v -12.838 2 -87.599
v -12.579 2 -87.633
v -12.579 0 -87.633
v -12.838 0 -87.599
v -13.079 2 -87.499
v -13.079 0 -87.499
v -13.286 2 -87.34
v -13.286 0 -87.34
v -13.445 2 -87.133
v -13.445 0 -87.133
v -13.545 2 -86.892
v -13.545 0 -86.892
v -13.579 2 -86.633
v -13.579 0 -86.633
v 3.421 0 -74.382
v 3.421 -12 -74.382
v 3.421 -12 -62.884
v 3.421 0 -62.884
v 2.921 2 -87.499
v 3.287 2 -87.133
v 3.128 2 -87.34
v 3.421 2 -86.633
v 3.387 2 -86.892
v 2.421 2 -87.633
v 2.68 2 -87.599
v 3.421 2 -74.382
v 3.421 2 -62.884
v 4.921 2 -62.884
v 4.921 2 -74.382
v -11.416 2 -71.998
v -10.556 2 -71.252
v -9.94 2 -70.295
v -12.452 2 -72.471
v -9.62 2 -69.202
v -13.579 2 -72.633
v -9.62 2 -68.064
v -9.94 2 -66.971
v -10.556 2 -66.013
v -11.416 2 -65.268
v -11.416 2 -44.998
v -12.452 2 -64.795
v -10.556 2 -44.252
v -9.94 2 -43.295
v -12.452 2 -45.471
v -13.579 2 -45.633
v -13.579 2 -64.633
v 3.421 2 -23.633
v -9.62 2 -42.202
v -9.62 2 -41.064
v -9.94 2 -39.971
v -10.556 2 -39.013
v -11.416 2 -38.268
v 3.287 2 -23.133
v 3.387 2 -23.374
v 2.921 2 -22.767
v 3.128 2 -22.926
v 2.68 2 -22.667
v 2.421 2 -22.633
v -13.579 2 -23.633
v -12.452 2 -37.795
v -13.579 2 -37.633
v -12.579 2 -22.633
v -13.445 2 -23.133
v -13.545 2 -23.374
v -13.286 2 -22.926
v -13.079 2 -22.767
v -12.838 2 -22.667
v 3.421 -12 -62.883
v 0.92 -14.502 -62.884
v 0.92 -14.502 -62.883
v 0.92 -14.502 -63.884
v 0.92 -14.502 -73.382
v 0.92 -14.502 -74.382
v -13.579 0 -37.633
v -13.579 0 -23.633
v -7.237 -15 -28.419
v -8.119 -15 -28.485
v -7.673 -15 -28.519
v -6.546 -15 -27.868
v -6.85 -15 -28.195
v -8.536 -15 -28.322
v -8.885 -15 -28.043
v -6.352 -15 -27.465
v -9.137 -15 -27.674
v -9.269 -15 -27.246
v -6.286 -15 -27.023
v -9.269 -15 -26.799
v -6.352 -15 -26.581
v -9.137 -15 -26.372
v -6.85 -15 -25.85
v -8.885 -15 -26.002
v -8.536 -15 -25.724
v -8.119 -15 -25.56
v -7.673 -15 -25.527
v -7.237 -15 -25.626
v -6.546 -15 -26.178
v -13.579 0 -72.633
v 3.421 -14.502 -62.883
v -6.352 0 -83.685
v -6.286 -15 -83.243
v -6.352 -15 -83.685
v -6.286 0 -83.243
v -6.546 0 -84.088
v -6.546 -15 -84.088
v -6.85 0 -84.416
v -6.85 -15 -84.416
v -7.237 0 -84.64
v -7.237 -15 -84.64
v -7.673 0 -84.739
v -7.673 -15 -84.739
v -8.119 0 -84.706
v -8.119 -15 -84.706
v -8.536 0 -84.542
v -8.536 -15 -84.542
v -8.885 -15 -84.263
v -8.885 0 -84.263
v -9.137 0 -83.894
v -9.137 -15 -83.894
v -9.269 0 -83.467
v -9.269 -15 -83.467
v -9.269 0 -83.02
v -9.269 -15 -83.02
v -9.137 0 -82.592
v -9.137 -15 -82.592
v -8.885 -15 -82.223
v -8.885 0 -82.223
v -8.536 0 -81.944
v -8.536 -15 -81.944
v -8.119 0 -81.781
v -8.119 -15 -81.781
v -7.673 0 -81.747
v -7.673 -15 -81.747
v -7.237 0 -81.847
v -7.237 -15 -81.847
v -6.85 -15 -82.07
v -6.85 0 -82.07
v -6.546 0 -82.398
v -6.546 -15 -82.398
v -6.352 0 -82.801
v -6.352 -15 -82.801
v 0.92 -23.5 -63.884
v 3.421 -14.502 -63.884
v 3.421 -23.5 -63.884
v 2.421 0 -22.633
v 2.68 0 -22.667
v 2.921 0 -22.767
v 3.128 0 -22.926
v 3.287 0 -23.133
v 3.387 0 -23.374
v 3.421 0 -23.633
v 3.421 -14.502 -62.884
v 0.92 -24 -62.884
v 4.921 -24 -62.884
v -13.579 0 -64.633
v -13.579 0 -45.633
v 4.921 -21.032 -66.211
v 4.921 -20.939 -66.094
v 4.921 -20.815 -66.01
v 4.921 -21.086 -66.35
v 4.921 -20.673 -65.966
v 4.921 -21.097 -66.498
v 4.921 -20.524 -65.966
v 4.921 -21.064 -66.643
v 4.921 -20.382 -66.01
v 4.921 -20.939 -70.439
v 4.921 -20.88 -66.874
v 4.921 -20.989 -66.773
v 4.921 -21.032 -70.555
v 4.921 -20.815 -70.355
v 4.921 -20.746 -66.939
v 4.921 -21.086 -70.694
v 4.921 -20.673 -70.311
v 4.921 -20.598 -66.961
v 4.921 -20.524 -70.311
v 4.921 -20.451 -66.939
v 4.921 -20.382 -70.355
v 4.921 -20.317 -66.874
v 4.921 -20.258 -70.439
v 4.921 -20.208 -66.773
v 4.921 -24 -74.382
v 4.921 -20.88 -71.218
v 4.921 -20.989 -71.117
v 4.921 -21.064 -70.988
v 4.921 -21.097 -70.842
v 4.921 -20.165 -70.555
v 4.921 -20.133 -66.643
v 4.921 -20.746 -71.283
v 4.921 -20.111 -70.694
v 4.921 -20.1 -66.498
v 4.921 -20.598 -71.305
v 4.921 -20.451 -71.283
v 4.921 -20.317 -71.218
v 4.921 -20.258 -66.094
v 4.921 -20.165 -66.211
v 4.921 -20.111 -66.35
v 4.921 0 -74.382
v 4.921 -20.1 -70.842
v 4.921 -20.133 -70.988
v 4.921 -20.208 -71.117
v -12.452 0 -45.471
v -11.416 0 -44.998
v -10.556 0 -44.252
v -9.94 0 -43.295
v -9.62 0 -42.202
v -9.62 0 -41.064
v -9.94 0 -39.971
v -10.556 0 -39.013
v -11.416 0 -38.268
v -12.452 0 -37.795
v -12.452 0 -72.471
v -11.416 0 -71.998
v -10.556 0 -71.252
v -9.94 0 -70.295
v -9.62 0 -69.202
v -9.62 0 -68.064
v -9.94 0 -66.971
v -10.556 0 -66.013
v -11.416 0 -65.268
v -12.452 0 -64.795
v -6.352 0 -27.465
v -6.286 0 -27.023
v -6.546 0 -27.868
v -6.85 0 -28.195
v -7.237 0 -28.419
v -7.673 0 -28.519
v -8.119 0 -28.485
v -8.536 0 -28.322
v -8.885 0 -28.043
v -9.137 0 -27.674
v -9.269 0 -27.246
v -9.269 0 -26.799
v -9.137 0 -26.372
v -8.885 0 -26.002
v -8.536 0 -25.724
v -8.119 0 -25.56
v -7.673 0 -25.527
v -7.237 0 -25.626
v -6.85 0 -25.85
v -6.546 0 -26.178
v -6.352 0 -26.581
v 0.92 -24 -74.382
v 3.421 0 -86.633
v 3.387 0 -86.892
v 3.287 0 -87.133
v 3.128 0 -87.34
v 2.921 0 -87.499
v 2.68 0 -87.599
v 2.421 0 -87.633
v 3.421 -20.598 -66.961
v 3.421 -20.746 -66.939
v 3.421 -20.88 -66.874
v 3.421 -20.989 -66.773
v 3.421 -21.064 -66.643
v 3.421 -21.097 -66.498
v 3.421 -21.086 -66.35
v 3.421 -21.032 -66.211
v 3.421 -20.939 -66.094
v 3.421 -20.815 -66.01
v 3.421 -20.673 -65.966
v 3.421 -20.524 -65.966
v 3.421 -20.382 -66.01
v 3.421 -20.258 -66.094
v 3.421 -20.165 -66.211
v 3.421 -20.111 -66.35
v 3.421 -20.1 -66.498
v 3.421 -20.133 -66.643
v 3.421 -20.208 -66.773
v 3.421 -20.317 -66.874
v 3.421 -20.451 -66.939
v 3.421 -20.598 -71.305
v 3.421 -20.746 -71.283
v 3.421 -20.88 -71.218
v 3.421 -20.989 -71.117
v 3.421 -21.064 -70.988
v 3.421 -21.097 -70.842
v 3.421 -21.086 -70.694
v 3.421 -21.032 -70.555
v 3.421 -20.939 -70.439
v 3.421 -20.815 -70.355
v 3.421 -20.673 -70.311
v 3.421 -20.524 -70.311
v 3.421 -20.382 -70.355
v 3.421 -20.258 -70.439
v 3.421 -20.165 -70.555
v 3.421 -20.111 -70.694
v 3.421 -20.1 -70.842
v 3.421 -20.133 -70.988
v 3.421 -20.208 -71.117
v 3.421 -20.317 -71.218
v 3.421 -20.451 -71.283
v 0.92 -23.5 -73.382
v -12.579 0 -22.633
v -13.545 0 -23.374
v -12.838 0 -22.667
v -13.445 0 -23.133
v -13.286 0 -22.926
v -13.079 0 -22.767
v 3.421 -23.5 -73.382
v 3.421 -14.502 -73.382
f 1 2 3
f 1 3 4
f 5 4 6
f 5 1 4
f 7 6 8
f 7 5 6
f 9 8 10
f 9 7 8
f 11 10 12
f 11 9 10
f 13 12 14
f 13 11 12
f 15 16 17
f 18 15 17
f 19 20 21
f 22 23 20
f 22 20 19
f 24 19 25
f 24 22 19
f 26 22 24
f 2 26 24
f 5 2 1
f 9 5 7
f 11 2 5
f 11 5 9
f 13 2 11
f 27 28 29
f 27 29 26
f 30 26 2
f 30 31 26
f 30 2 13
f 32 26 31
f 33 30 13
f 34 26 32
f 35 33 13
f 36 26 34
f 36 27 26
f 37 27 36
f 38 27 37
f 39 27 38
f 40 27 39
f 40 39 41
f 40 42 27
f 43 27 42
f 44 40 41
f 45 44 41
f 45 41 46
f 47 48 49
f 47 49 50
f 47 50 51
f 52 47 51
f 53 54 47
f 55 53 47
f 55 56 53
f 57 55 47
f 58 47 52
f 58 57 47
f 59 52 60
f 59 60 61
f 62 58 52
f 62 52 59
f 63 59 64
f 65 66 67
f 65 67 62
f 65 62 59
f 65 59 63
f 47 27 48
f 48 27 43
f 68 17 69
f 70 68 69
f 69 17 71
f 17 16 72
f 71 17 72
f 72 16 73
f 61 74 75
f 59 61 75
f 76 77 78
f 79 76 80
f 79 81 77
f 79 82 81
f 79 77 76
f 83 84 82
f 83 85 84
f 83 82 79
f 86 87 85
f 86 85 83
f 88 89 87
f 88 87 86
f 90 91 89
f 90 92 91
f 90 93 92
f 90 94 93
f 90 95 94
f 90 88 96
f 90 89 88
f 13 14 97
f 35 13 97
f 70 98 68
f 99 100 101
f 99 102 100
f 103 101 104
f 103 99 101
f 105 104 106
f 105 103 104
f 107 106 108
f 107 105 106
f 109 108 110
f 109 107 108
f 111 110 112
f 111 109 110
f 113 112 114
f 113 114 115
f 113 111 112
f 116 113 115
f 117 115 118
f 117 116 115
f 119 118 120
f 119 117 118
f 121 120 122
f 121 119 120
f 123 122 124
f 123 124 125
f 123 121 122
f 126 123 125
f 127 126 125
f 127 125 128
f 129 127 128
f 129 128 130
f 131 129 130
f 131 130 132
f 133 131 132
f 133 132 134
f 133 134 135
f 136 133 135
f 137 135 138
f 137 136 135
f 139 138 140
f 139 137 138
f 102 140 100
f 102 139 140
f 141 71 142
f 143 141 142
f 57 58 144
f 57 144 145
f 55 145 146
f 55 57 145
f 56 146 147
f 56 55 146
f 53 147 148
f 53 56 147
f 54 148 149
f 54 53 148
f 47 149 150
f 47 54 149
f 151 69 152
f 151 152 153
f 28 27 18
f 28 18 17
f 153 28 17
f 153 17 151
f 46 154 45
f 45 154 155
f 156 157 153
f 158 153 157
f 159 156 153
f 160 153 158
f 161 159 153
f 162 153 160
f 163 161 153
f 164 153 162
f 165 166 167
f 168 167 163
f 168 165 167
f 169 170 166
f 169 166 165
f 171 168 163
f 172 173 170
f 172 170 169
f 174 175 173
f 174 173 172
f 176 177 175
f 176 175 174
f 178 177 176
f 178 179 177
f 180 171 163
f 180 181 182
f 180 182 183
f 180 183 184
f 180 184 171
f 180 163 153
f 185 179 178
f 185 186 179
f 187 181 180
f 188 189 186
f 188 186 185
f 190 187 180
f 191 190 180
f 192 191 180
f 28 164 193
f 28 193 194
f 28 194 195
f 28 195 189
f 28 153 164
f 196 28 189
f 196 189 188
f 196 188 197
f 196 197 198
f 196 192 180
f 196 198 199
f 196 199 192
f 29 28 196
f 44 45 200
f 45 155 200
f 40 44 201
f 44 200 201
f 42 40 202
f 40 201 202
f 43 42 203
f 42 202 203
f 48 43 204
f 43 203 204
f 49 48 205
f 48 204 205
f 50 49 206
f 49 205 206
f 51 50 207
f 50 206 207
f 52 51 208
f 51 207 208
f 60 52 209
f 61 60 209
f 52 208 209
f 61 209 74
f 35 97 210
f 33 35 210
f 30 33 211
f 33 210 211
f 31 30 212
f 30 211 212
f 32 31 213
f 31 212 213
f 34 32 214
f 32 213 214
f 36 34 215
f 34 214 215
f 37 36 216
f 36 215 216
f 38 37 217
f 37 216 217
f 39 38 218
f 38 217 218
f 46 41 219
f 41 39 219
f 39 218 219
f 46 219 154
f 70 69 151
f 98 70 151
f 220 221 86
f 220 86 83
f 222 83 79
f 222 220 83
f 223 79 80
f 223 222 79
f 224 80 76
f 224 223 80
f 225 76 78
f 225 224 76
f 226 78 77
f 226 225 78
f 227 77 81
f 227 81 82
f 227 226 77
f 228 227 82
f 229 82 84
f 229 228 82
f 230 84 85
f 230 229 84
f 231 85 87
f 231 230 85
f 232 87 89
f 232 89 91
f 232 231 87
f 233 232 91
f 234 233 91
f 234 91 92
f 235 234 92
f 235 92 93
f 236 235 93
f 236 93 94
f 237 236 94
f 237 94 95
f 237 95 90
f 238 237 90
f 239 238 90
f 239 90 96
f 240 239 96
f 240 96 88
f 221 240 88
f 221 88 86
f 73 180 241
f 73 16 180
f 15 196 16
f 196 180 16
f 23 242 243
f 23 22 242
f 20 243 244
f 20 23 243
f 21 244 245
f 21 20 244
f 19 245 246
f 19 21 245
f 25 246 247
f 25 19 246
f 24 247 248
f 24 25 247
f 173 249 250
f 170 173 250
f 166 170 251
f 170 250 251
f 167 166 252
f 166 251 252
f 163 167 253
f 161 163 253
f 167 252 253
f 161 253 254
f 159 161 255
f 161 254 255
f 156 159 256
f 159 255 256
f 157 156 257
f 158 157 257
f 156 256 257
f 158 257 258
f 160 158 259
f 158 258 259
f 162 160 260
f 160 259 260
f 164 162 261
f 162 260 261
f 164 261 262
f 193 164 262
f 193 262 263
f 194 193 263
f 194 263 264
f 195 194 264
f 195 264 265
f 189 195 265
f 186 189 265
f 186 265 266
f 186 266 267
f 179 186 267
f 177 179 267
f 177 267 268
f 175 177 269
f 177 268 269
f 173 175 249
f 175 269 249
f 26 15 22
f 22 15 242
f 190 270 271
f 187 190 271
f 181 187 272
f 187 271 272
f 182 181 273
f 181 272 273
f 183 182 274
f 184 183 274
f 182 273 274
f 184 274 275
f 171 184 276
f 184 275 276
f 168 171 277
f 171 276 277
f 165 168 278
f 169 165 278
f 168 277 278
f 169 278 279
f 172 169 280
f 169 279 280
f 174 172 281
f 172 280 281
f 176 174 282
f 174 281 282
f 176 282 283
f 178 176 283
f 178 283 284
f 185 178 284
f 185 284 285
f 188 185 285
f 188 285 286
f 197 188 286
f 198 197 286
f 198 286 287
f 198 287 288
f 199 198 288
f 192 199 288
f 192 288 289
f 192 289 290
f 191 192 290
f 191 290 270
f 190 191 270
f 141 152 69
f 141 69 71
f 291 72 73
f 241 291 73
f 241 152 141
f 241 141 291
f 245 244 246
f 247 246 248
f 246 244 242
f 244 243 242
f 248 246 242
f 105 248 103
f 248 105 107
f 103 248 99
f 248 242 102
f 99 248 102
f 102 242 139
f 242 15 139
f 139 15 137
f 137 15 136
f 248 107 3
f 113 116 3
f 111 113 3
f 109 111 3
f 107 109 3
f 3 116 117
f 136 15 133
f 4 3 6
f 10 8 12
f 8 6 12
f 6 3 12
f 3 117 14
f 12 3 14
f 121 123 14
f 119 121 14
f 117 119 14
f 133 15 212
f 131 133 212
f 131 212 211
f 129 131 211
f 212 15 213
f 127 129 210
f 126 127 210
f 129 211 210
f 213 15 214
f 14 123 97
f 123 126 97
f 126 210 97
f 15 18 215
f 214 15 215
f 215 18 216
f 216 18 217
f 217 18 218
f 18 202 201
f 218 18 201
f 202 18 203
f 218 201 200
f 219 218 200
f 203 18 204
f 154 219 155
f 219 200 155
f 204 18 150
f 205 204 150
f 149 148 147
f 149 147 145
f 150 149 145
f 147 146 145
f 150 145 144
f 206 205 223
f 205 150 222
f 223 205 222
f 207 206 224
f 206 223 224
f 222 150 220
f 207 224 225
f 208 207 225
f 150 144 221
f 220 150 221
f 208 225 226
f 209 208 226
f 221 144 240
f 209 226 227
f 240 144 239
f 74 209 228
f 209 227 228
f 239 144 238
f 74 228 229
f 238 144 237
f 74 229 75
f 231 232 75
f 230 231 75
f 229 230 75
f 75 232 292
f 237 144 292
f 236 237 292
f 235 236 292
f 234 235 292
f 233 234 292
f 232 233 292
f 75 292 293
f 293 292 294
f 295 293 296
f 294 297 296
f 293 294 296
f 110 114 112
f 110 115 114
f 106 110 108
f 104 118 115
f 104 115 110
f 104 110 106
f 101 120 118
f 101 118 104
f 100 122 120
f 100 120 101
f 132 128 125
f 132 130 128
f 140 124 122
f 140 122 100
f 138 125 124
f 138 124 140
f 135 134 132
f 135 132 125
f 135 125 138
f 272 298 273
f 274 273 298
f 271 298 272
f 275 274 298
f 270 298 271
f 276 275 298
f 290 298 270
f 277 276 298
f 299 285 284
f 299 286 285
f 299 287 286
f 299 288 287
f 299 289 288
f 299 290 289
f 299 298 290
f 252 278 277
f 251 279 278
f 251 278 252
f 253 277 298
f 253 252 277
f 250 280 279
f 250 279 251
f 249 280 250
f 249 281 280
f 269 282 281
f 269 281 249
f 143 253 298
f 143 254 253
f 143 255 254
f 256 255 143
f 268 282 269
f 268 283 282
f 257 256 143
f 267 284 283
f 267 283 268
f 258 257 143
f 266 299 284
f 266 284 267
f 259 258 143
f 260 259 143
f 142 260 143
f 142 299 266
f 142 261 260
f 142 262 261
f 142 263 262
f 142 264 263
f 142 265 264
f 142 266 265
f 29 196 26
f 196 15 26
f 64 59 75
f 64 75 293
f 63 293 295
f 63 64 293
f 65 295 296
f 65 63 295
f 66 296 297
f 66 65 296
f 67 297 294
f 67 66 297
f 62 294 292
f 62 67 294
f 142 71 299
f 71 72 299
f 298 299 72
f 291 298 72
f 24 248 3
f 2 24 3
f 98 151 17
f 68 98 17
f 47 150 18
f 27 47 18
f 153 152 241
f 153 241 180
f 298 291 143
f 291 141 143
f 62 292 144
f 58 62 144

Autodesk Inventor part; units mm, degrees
ref_plane "YZ Plane" through (0, 0, 0) normal (1, 0, 0) x (0, 1, 0)
ref_plane "XZ Plane" through (0, 0, 0) normal (0, 1, 0) x (-1, 0, 0)
ref_plane "XY Plane" through (0, 0, 0) normal (0, 0, 1) x (1, 0, 0)
sketch "Sketch7" plane through (0, 0, 0) normal (0, 1, 0) x (-1, 0, 0)
  line L0 (13.5789, -22.6329) -> (-3.4211, -22.6329)
  line L1 (-3.4211, -22.6329) -> (-3.4211, -87.6329)
  line L2 (-3.4211, -87.6329) -> (13.5789, -87.6329)
  line L3 (13.5789, -87.6329) -> (13.5789, -22.6329)
  point P0 (0, 0)
  dimension "d16" = 65
  dimension "d17" = 17
extrude "Extrusion4" add sketch "Sketch7" along normal blind 2
fillet "Fillet1" radius 1 4 edges at (3.4211, 1, -22.6329) (-13.5789, 1, -22.6329) (3.4211, 1, -87.6329) (-13.5789, 1, -87.6329)
sketch "Sketch15" plane through (0, 0, 0) normal (0, -1, 0) x (1, 0, 0)
  line L0 (-13.5789, -86.6329) -> (-13.5789, -23.6329) projected
  line L1 (-13.5789, -55.1329) -> (3.4211, -55.1329)
  line L2 (3.4211, -23.6329) -> (3.4211, -86.6329) projected
  line L3 (-13.5789, -55.1329) -> (-13.5789, -68.6329)
  circle A0 centre (-13.5789, -68.6329) radius 4
  circle A1 centre (-13.5789, -41.6329) radius 4
  point P0 (0, 0)
  dimension "d46" = 13.5
  dimension "d47" = 8
extrude "Extrusion8" cut sketch "Sketch15" against normal blind 5
sketch "Sketch16" plane through (0, 0, 0) normal (0, -1, 0) x (1, 0, 0)
  arc A0 (-13.5789, -72.6329) -> (-13.5789, -64.6329) centre (-13.5789, -68.6329) ccw projected
  line L0 (-13.5789, -68.6329) -> (-7.7855, -83.2432)
  line L1 (-13.5789, -68.6329) -> (2.1381, -68.6329) construction
  circle A1 centre (-7.7855, -83.2432) radius 1.5
  line L2 (-13.5789, -64.6329) -> (-13.5789, -45.6329) construction
  line L3 (-13.5789, -55.1329) -> (3.4211, -55.1329) construction
  line L4 (3.4211, -23.6329) -> (3.4211, -86.6329) construction
  line L5 (-13.5789, -41.6329) -> (-7.7855, -27.0227)
  circle A2 centre (-7.7855, -27.0227) radius 1.5
  circle A3 centre (-7.7855, -83.2432) radius 2
  circle A4 centre (-7.7855, -27.0227) radius 2
  point P0 (0, 0)
  dimension "d50" = 15.717
  dimension "d51" = 68.37
  dimension "d52" = 3
  dimension "d55" = 4
  dimension "d56" = 4
extrude "Extrusion9" add sketch "Sketch16" along normal blind 15 contours A1 | A2
sketch "Sketch17" plane through (0, 2, 0) normal (0, 1, 0) x (1, 0, 0)
  line L0 (-12.5789, 22.6329) -> (2.4211, 22.6329) construction
  line L1 (0, 22.6329) -> (0, 87.6329) construction
  line L2 (2.4211, 87.6329) -> (-12.5789, 87.6329) construction
  arc A0 (-13.5789, 64.6329) -> (-13.5789, 72.6329) centre (-13.5789, 68.6329) ccw construction
  line L3 (-13.5789, 68.6329) -> (3.4211, 68.6329) construction
  line L4 (3.4211, 23.6329) -> (3.4211, 86.6329) construction
  line L5 (-9.5789, 62.8384) -> (-9.5789, 74.4274) construction
  point P0 (0, 0)
  point P1 (-9.5789, 68.6329)
  dimension "d57" = 11.589
sketch "Sketch25" plane through (0, 2, 0) normal (0, 1, 0) x (1, 0, 0)
  line L0 (3.4211, 23.6329) -> (3.4211, 86.6329) projected
  arc A0 (-13.5789, 64.6329) -> (-13.5789, 72.6329) centre (-13.5789, 68.6329) ccw projected
  point P0 (0, 0)
sketch "Sketch27" plane through (3.4211, 0, -86.6329) normal (1, 0, 0) x (0, 0, -1)
  line L0 (-63, 2) -> (0, 2) projected
  line L1 (-23.7493, 0) -> (-12.2507, 0)
  line L2 (-12.2507, 0) -> (-12.2507, 2)
  line L3 (-12.2507, 2) -> (-23.7493, 2)
  line L4 (-23.7493, 2) -> (-23.7493, 0)
  point P0 (-86.6329, 0)
extrude "Extrusion16" add sketch "Sketch27" along normal blind 1.5
sketch "Sketch28" plane through (0, 0, 0) normal (0, -1, 0) x (1, 0, 0)
  line L0 (4.9211, -74.3823) -> (3.4211, -74.3823)
  line L1 (3.4211, -74.3823) -> (3.4211, -62.8836)
  line L2 (3.4211, -62.8836) -> (4.9211, -62.8836)
  line L3 (4.9211, -62.8836) -> (4.9211, -74.3823)
  point P0 (0, 0)
extrude "Extrusion17" add sketch "Sketch28" along normal blind 24
sketch "Sketch29" plane through (4.9211, 0, -86.6329) normal (1, 0, 0) x (0, 0, -1)
  line L0 (-22, 2) -> (-14, 2) construction
  line L1 (-18, 2) -> (-18, -24) construction
  line L2 (-23.7493, -24) -> (-12.2507, -24) construction
  circle A0 centre (-20.1722, -20.5985) radius 0.5
  circle A1 centre (-15.8278, -20.5985) radius 0.5
  point P0 (-86.6329, 0)
  dimension "d97" = 1
hole "Hole4" at (4.9211, -20.5985, -66.4608) at (4.9211, -20.5985, -70.8051) direction (-1, 0, 0) diameter 1 end through all
sketch "Sketch31" plane through (4.9211, 2, -74.3823) normal (0, 0, -1) x (-1, 0, 0)
  point P0 (4.9211, -2)
sketch "Sketch35" plane through (4.9211, 2, -74.3823) normal (0, 0, -1) x (-1, 0, 0)
  point P0 (4.9211, -2)
sketch "Sketch36" plane through (4.9211, 2, -74.3823) normal (0, 0, -1) x (-1, 0, 0)
  line L0 (1.5, -26) -> (1.5, -14)
  line L1 (1.5, -2) -> (1.5, -26) projected
  line L2 (1.5, -14) -> (4.0015, -16.5015)
  line L3 (1.5, -14) -> (5.0376, -14) construction
  line L4 (4.0015, -16.5015) -> (1.5, -16.5015)
  point P0 (4.9211, -2)
  dimension "d111" = 12
  dimension "d112" = 45
extrude "Extrusion21" add sketch "Sketch36" against normal blind 11.499
sketch "Sketch38" plane through (4.9211, 2, -74.3823) normal (0, 0, -1) x (-1, 0, 0)
  line L0 (4.0015, -16.5015) -> (4.0015, -26)
  line L1 (4.0015, -26) -> (1.5, -26)
  line L2 (4.0015, -16.5015) -> (1.5, -16.5015)
  line L3 (1.5, -16.5015) -> (4.0015, -16.5015) projected
  line L4 (1.5, -16.5015) -> (1.5, -26)
  point P0 (4.9211, -2)
sketch "Sketch39" plane through (3.4211, 2, -62.8836) normal (0, 0, 1) x (1, 0, 0)
  line L0 (-2.5015, -16.5015) -> (-2.5015, -26)
  line L1 (-2.5015, -26) -> (0, -26)
  line L2 (0, -26) -> (1.5, -26) projected
  line L3 (-2.5015, -16.5015) -> (0, -16.5015)
  line L4 (-2.5015, -16.5015) -> (0, -16.5015) projected
  line L5 (0, -16.5015) -> (0, -26)
  line L6 (0, -16.5015) -> (0, -26) projected
  point P0 (-3.4211, -2)
extrude "Extrusion22" add sketch "Sketch38" against normal blind 1
extrude "Extrusion23" add sketch "Sketch39" against normal blind 1
sketch "Sketch40" plane through (0, -24, 0) normal (0, -1, 0) x (1, 0, 0)
  line L0 (0.9196, -63.8836) -> (0.9196, -73.3823)
  line L1 (0.9196, -73.3823) -> (3.4211, -73.3823)
  line L2 (3.4211, -74.3823) -> (3.4211, -62.8836) projected
  line L3 (3.4211, -73.3823) -> (3.4211, -63.8836)
  line L4 (3.4211, -63.8836) -> (0.9196, -63.8836)
  line L5 (3.4211, -63.8836) -> (0.9196, -63.8836) projected
  point P0 (0, 0)
extrude "Extrusion24" add sketch "Sketch40" against normal blind 0.5
sketch "Sketch41" plane through (3.4211, -14.5015, -73.3823) normal (-1, 0, 0) x (0, 0, 1)
  point P0 (73.3823, 14.5015)
properties part number "Latch"
